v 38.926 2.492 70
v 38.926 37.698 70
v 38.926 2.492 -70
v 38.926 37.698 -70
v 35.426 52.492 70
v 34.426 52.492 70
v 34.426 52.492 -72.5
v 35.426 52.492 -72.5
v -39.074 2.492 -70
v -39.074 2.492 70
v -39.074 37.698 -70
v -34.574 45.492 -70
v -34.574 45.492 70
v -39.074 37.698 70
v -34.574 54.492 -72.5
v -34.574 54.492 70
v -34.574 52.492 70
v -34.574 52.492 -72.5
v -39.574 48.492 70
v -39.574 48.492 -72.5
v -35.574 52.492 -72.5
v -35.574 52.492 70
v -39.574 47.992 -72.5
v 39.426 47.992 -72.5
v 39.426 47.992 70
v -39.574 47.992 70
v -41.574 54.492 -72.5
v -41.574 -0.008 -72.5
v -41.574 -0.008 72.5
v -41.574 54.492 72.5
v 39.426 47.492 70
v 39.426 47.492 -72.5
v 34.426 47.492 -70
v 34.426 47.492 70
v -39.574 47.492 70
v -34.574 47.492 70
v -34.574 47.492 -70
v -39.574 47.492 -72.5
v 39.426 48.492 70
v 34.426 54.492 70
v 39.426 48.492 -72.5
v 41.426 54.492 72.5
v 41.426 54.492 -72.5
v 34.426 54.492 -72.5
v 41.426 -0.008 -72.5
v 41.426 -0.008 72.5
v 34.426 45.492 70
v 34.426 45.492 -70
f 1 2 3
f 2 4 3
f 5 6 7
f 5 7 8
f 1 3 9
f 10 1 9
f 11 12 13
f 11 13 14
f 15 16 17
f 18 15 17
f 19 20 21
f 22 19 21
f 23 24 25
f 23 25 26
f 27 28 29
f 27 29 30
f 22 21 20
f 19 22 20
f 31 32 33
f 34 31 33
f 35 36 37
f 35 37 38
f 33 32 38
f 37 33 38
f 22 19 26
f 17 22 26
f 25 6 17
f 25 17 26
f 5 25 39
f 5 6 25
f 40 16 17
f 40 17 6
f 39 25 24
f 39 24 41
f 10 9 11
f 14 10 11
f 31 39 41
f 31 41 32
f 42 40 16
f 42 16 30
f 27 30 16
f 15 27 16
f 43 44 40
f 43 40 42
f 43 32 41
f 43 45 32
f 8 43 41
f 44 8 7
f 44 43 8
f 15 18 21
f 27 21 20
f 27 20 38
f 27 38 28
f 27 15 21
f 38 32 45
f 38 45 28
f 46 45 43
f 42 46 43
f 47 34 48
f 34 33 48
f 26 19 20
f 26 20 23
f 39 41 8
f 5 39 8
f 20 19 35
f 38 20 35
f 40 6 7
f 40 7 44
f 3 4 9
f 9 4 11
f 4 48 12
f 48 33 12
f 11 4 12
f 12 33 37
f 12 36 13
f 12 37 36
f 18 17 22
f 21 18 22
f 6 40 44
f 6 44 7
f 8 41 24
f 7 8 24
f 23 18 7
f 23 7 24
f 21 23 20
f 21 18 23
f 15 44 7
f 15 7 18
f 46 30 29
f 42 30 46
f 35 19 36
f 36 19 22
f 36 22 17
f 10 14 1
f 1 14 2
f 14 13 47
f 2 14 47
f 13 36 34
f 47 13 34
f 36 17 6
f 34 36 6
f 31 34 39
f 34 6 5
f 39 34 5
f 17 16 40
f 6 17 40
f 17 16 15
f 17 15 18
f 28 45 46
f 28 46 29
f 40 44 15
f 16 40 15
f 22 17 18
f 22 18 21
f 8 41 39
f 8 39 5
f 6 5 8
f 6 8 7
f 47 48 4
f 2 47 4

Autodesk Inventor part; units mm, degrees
ref_plane "YZ Plane" through (0, 0, 0) normal (1, 0, 0) x (0, 1, 0)
ref_plane "XZ Plane" through (0, 0, 0) normal (0, 1, 0) x (-1, 0, 0)
ref_plane "XY Plane" through (0, 0, 0) normal (0, 0, 1) x (1, 0, 0)
sketch "Sketch2" plane through (0, 0, 0) normal (0, 0, 1) x (1, 0, 0)
  line L0 (-39.0745, 47.4918) -> (38.9255, 47.4918) construction
  line L1 (38.9255, 47.4918) -> (38.9255, 37.6976) construction
  line L2 (38.9255, 2.4918) -> (-39.0745, 2.4918)
  line L3 (-39.0745, 2.4918) -> (-39.0745, 37.6976)
  line L4 (-41.5745, 54.4918) -> (-34.5745, 54.4918)
  line L5 (41.4255, 54.4918) -> (41.4255, -0.0082)
  line L6 (41.4255, -0.0082) -> (-41.5745, -0.0082)
  line L7 (-41.5745, -0.0082) -> (-41.5745, 54.4918)
  line L8 (-0.0745, 2.4918) -> (-0.0745, -0.0082)
  line L9 (-34.5745, 54.4918) -> (-34.5745, 52.4918)
  line L10 (-34.5745, 54.4918) -> (-34.5745, 52.4918)
  line L11 (-34.5745, 52.4918) -> (-35.5745, 52.4918)
  line L12 (-39.5745, 48.4918) -> (-39.5745, 47.4918)
  line L13 (-39.5745, 47.4918) -> (-34.5745, 47.4918)
  line L14 (-39.5745, 48.4918) -> (-35.5745, 52.4918)
  line L15 (34.4255, 54.4918) -> (34.4255, 52.4918)
  line L16 (34.4255, 54.4918) -> (34.4255, 52.4918)
  line L17 (34.4255, 52.4918) -> (35.4255, 52.4918)
  line L18 (39.4255, 48.4918) -> (39.4255, 47.4918)
  line L19 (39.4255, 47.4918) -> (34.4255, 47.4918)
  line L20 (39.4255, 48.4918) -> (35.4255, 52.4918)
  line L21 (-34.5745, 47.4918) -> (-34.5745, 45.4918)
  line L22 (-34.5745, 45.4918) -> (-39.0745, 37.6976)
  line L23 (-34.5745, 45.4918) -> (-24.5745, 45.4918) construction
  line L24 (-34.5745, 52.4918) -> (-34.5745, 47.4918) construction
  line L25 (-34.5745, 54.4918) -> (34.4255, 54.4918) construction
  line L26 (34.4255, 54.4918) -> (41.4255, 54.4918)
  line L27 (34.4255, 47.4918) -> (34.4255, 45.4918)
  line L28 (34.4255, 45.4918) -> (38.9255, 37.6976)
  line L29 (34.4255, 54.4918) -> (-34.5745, 54.4918) construction
  line L30 (34.4255, 52.4918) -> (34.4255, 47.4918) construction
  line L31 (-39.0745, 37.6976) -> (-39.0745, 47.4918) construction
  line L32 (38.9255, 37.6976) -> (38.9255, 2.4918)
  point P0 (-39.5745, 52.4918)
  dimension "d13" = 78
  dimension "d14" = 45
  dimension "d15" = 83
  dimension "d16" = 54.5
  dimension "d17" = 2.5
  dimension "d18" = 7
  dimension "d19" = 7
  dimension "d20" = 2
  dimension "d21" = 5
  dimension "d22" = 5
  dimension "d23" = 5
  dimension "d24" = 4
  dimension "d25" = 4
  dimension "d26" = 2
  dimension "d28" = 120
extrude "Extrusion1" add sketch "Sketch2" along normal mid plane 140
sketch "Sketch3" plane through (0, 0, 70) normal (0, 0, 1) x (1, 0, 0)
  line L0 (-34.5745, 54.4918) -> (-41.5745, 54.4918) projected
  line L1 (41.4255, -0.0082) -> (41.4255, 54.4918) projected
  line L2 (-41.5745, 54.4918) -> (41.4255, 54.4918)
  line L3 (41.4255, 54.4918) -> (41.4255, -0.0082)
  line L4 (41.4255, -0.0082) -> (-41.5745, -0.0082)
  line L5 (-41.5745, -0.0082) -> (-41.5745, 54.4918)
  point P0 (0, 0)
extrude "Extrusion2" add sketch "Sketch3" along normal blind 2.5
sketch "Sketch4" plane through (0, 0, -70) normal (0, 0, -1) x (-1, 0, 0)
  line L0 (34.5745, 45.4918) -> (39.0745, 37.6976) projected
  line L1 (39.0745, 37.6976) -> (39.0745, 2.4918) projected
  line L2 (39.0745, 2.4918) -> (-38.9255, 2.4918) projected
  line L3 (-38.9255, 2.4918) -> (-38.9255, 37.6976) projected
  line L4 (-38.9255, 37.6976) -> (-34.4255, 45.4918) projected
  line L5 (-34.4255, 45.4918) -> (-34.4255, 47.4918) projected
  line L6 (-34.4255, 47.4918) -> (-39.4255, 47.4918) projected
  line L7 (-39.4255, 47.4918) -> (-39.4255, 48.4918) projected
  line L8 (-39.4255, 48.4918) -> (-35.4255, 52.4918) projected
  line L9 (-35.4255, 52.4918) -> (-34.4255, 52.4918) projected
  line L10 (-34.4255, 52.4918) -> (-34.4255, 54.4918) projected
  line L11 (-34.4255, 54.4918) -> (-41.4255, 54.4918) projected
  line L12 (-41.4255, 54.4918) -> (-41.4255, -0.0082) projected
  line L13 (-41.4255, -0.0082) -> (41.5745, -0.0082) projected
  line L14 (41.5745, -0.0082) -> (41.5745, 54.4918) projected
  line L15 (41.5745, 54.4918) -> (34.5745, 54.4918) projected
  line L16 (34.5745, 54.4918) -> (34.5745, 52.4918) projected
  line L17 (34.5745, 52.4918) -> (35.5745, 52.4918) projected
  line L18 (35.5745, 52.4918) -> (39.5745, 48.4918) projected
  line L19 (39.5745, 48.4918) -> (39.5745, 47.4918) projected
  line L20 (39.5745, 47.4918) -> (34.5745, 47.4918) projected
  line L21 (34.5745, 47.4918) -> (34.5745, 45.4918) projected
  line L22 (-38.9255, 37.6976) -> (-38.9255, 47.4918)
  line L23 (39.0745, 37.6976) -> (39.0745, 47.4918)
  line L24 (39.0745, 47.4918) -> (-38.9255, 47.4918)
extrude "Extrusion3" add sketch "Sketch4" along normal blind 2.5
sketch "Sketch7" plane through (0, 0, -72.5) normal (0, 0, -1) x (-1, 0, 0)
  line L0 (-39.4255, 47.4918) -> (-39.4255, 48.4918) projected
  line L1 (-39.4255, 48.4918) -> (-35.4255, 52.4918) projected
  line L2 (-35.4255, 52.4918) -> (-34.4255, 52.4918) projected
  line L3 (-34.4255, 52.4918) -> (-34.4255, 54.4918) projected
  line L4 (-34.4255, 54.4918) -> (-41.4255, 54.4918) projected
  line L5 (-41.4255, 54.4918) -> (-41.4255, -0.0082) projected
  line L6 (-41.4255, -0.0082) -> (41.5745, -0.0082) projected
  line L7 (41.5745, -0.0082) -> (41.5745, 54.4918) projected
  line L8 (41.5745, 54.4918) -> (34.5745, 54.4918) projected
  line L9 (34.5745, 54.4918) -> (34.5745, 52.4918) projected
  line L10 (34.5745, 52.4918) -> (35.5745, 52.4918) projected
  line L11 (35.5745, 52.4918) -> (39.5745, 48.4918) projected
  line L12 (39.5745, 48.4918) -> (39.5745, 47.4918) projected
  line L13 (39.5745, 47.4918) -> (-39.4255, 47.4918) projected
  line L14 (-34.4255, 54.4918) -> (34.5745, 54.4918)
  line L15 (-39.4255, 47.4918) -> (-39.4255, 47.9918)
  line L16 (-39.4255, 47.9918) -> (39.5745, 47.9918)
  point P0 (0, 0)
extrude "Extrusion5" add sketch "Sketch7" against normal up to next separate body contours L0 L1 L2 L3 L14 L9 L10 L11 L12 L16
equation "\"d25\" = d24"
properties part number "razerbasilisku" material "ABS Plastic"
